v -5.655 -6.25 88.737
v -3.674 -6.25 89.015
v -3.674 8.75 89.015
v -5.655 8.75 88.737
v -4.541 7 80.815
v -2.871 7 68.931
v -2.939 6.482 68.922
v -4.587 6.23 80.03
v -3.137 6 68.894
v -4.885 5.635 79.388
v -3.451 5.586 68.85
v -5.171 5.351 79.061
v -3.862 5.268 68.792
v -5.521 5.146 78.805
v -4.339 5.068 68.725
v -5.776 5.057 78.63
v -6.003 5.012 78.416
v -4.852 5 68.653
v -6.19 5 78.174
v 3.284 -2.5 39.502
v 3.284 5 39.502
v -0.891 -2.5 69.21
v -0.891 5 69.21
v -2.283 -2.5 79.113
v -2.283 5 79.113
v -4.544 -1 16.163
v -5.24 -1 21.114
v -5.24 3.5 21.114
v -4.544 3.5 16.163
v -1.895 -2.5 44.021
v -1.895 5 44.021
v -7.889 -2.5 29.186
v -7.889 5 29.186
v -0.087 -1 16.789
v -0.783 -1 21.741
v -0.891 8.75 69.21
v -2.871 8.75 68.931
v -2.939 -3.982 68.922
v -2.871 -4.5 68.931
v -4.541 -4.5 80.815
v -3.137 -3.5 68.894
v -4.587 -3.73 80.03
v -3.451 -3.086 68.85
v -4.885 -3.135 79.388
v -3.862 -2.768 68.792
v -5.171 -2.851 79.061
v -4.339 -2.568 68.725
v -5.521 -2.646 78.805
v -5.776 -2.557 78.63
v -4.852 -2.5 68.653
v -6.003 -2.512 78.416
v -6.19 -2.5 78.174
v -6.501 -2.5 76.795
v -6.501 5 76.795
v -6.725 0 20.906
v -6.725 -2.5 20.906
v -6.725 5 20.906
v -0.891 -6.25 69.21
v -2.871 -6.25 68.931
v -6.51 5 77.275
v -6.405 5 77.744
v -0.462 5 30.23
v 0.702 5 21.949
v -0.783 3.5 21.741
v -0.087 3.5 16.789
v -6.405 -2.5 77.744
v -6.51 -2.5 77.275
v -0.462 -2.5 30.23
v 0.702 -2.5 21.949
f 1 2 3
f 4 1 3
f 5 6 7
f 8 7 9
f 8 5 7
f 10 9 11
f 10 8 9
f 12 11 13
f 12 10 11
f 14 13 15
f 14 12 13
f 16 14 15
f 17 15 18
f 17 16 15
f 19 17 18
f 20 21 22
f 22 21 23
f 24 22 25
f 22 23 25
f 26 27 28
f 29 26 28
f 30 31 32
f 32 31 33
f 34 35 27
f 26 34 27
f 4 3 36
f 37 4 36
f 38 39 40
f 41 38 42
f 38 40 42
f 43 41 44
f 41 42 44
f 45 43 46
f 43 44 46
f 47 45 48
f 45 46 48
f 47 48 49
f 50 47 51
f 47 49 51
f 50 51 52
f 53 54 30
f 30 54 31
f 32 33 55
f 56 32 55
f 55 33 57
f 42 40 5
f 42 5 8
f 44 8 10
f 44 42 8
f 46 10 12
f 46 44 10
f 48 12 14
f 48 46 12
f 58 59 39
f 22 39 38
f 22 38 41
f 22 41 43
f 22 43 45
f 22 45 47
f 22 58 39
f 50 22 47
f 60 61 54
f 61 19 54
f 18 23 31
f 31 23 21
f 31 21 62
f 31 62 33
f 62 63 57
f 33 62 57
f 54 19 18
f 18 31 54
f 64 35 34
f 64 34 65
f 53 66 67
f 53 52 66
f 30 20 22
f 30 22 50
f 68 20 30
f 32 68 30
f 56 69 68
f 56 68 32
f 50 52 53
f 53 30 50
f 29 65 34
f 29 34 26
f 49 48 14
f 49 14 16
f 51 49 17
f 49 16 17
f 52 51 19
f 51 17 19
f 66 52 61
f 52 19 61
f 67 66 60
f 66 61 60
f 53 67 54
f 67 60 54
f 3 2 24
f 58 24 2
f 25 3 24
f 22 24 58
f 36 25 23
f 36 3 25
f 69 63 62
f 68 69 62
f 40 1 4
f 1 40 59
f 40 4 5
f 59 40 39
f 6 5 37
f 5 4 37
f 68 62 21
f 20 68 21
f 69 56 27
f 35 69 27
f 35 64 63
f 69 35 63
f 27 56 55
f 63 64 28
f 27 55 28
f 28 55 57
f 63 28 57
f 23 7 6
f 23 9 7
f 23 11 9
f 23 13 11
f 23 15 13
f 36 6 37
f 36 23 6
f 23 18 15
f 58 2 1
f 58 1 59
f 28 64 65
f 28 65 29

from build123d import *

# Parameters (mm, degrees)
ESQUISSE2_R                  = 20
BOSS_EXTRU_1_DEPTH           = 5
BOSS_EXTRU_2_DEPTH           = 5
R_P_TITION_CIRCULAIRE1_COUNT = 24
D_GAGEMENT_M22_D             = 5.1
BOSS_EXTRU_3_DEPTH           = 7.5
ENL_V_MAT_EXTRU_2_DEPTH      = 83.82071633
ENL_V_MAT_EXTRU_2_DEPTH_BACK = 83.82071633
ESQUISSE13_W                 = 57.206213055
ESQUISSE13_H                 = 37.798612504
ESQUISSE14_W                 = 4.5
ESQUISSE14_H                 = 4.5
BOSS_EXTRU_5_DEPTH           = 5
ESQUISSE17_W                 = 20
ESQUISSE17_H                 = 15
BOSS_EXTRU_7_DEPTH           = 2
CONG_1_R                     = 2
CONG_2_R                     = 2


with BuildPart() as part:
    # Esquisse2 → Boss.-Extru.1 (new body)
    with BuildSketch(Plane(origin=(0, 0, 0), x_dir=(1, 0, 0), z_dir=(0, 1, 0))):
        with Locations(Location((0, 0, 0), (0, 0, 270))):
            Circle(ESQUISSE2_R)
    extrude(amount=BOSS_EXTRU_1_DEPTH)

    # Esquisse3 → Boss.-Extru.2 (add)
    with BuildSketch(Plane(origin=(0, 5, 0), x_dir=(1, 0, 0), z_dir=(0, 1, 0))):
        Polygon((-1.625, 19.933875062), (-1.25, 21.933875062), (1.25, 21.933875062), (1.625, 19.933875062), align=None)
    boss_extru_2 = extrude(amount=-BOSS_EXTRU_2_DEPTH)

    # Répétition circulaire1: Boss.-Extru.2 ×24 about axis
    r_p_tition_circulaire1_axis = Axis((0, 0, 0), (0, 1, 0))
    for i in range(1, R_P_TITION_CIRCULAIRE1_COUNT):
        add(boss_extru_2.rotate(r_p_tition_circulaire1_axis, i * 360 / R_P_TITION_CIRCULAIRE1_COUNT))

    # Dégagement M22 (through all)
    with Locations(Plane(origin=(0, 5, 0), x_dir=(1, 0, 0), z_dir=(0, 1, 0))):
        with Locations((0, 0)):
            Hole(D_GAGEMENT_M22_D / 2)

    # Esquisse11 → Boss.-Extru.3 (add)
    with BuildSketch(Plane(origin=(0, 5, 0), x_dir=(1, 0, 0), z_dir=(0, 1, 0))):
        Polygon((-5.801101772, -14.332121903), (1.625908743, -15.37592016), (-0.461687771, -30.229941191), (3.284378163, -39.501779737), (-2.282545875, -79.112502486), (-6.738752185, -78.486223532), (-1.894992792, -44.021084607), (-7.888698287, -29.186142934), align=None)
    extrude(amount=-BOSS_EXTRU_3_DEPTH)

    # Esquisse13 → Enlèv. mat.-Extru.2 (cut, two sides: drawn at the far end of the back side and taken through both)
    with BuildSketch(Plane(origin=(3.713505258, 0, 0.521899129), x_dir=(0.13917310096006574, 0, -0.9902680687415703), z_dir=(0.9902680687415703, 0, 0.13917310096006574)).offset(-ENL_V_MAT_EXTRU_2_DEPTH_BACK)):
        with Locations((6.964953995, 7.661661133)):
            Rectangle(ESQUISSE13_W, ESQUISSE13_H)
    extrude(amount=ENL_V_MAT_EXTRU_2_DEPTH + ENL_V_MAT_EXTRU_2_DEPTH_BACK, mode=Mode.SUBTRACT)

    # Esquisse14 → Boss.-Extru.5 (add)
    with BuildSketch(Plane(origin=(-3.011448787, 0, 21.427571519), x_dir=(-0.9902680687415703, 0, -0.13917310096006574), z_dir=(0.13917310096006574, 0, -0.9902680687415703))):
        with Locations((0, 1.25)):
            Rectangle(ESQUISSE14_W, ESQUISSE14_H)
    extrude(amount=BOSS_EXTRU_5_DEPTH)

    # Esquisse17 → Boss.-Extru.7 (add)
    with BuildSketch(Plane(origin=(8.664845601, 0, 1.217764633), x_dir=(0.13917310096006535, 0, -0.9902680687415704), z_dir=(0.9902680687415704, 0, 0.13917310096006535))):
        with Locations((-78.660254038, 1.25)):
            Rectangle(ESQUISSE17_W, ESQUISSE17_H)
    extrude(amount=-BOSS_EXTRU_7_DEPTH)

    # Congé1
    cong_1_edges = [part.edges().sort_by_distance(p)[0] for p in [
        (-3.567216508, -2.5, 73.882815941),
        (-3.567216508, 5, 73.882815941),
        (-4.263082013, 1.25, 78.834156284),
    ]]
    fillet(cong_1_edges, radius=CONG_1_R)

    # Congé2
    # the kernel refuses this fillet: 2 mm, written as the material it takes off along each edge
    with BuildSketch(Plane(origin=(-6.738752185, 9.270248109, 78.486223532), x_dir=(0.13917310096006505, 0, -0.9902680687415704), z_dir=(0, -1, 0))) as cong_2_piece_1:
        with BuildLine():
            CenterArc((1.708099244, 2), CONG_2_R, 202.024312837, 67.975687163)
            Line((-0.145950378, 1.25), (-0.33135534, 1.175))
            ThreePointArc((-0.33135534, 1.175), (-0.2, 0.5), (-0.2, 0))
            Line((-0.2, 0), (0, -0.2))
            Line((0, -0.2), (1.708099244, -0.2))
            Line((1.708099244, -0.2), (1.708099244, 0))
        make_face()
    extrude(amount=16.040496218, mode=Mode.SUBTRACT)


solid = part.part
